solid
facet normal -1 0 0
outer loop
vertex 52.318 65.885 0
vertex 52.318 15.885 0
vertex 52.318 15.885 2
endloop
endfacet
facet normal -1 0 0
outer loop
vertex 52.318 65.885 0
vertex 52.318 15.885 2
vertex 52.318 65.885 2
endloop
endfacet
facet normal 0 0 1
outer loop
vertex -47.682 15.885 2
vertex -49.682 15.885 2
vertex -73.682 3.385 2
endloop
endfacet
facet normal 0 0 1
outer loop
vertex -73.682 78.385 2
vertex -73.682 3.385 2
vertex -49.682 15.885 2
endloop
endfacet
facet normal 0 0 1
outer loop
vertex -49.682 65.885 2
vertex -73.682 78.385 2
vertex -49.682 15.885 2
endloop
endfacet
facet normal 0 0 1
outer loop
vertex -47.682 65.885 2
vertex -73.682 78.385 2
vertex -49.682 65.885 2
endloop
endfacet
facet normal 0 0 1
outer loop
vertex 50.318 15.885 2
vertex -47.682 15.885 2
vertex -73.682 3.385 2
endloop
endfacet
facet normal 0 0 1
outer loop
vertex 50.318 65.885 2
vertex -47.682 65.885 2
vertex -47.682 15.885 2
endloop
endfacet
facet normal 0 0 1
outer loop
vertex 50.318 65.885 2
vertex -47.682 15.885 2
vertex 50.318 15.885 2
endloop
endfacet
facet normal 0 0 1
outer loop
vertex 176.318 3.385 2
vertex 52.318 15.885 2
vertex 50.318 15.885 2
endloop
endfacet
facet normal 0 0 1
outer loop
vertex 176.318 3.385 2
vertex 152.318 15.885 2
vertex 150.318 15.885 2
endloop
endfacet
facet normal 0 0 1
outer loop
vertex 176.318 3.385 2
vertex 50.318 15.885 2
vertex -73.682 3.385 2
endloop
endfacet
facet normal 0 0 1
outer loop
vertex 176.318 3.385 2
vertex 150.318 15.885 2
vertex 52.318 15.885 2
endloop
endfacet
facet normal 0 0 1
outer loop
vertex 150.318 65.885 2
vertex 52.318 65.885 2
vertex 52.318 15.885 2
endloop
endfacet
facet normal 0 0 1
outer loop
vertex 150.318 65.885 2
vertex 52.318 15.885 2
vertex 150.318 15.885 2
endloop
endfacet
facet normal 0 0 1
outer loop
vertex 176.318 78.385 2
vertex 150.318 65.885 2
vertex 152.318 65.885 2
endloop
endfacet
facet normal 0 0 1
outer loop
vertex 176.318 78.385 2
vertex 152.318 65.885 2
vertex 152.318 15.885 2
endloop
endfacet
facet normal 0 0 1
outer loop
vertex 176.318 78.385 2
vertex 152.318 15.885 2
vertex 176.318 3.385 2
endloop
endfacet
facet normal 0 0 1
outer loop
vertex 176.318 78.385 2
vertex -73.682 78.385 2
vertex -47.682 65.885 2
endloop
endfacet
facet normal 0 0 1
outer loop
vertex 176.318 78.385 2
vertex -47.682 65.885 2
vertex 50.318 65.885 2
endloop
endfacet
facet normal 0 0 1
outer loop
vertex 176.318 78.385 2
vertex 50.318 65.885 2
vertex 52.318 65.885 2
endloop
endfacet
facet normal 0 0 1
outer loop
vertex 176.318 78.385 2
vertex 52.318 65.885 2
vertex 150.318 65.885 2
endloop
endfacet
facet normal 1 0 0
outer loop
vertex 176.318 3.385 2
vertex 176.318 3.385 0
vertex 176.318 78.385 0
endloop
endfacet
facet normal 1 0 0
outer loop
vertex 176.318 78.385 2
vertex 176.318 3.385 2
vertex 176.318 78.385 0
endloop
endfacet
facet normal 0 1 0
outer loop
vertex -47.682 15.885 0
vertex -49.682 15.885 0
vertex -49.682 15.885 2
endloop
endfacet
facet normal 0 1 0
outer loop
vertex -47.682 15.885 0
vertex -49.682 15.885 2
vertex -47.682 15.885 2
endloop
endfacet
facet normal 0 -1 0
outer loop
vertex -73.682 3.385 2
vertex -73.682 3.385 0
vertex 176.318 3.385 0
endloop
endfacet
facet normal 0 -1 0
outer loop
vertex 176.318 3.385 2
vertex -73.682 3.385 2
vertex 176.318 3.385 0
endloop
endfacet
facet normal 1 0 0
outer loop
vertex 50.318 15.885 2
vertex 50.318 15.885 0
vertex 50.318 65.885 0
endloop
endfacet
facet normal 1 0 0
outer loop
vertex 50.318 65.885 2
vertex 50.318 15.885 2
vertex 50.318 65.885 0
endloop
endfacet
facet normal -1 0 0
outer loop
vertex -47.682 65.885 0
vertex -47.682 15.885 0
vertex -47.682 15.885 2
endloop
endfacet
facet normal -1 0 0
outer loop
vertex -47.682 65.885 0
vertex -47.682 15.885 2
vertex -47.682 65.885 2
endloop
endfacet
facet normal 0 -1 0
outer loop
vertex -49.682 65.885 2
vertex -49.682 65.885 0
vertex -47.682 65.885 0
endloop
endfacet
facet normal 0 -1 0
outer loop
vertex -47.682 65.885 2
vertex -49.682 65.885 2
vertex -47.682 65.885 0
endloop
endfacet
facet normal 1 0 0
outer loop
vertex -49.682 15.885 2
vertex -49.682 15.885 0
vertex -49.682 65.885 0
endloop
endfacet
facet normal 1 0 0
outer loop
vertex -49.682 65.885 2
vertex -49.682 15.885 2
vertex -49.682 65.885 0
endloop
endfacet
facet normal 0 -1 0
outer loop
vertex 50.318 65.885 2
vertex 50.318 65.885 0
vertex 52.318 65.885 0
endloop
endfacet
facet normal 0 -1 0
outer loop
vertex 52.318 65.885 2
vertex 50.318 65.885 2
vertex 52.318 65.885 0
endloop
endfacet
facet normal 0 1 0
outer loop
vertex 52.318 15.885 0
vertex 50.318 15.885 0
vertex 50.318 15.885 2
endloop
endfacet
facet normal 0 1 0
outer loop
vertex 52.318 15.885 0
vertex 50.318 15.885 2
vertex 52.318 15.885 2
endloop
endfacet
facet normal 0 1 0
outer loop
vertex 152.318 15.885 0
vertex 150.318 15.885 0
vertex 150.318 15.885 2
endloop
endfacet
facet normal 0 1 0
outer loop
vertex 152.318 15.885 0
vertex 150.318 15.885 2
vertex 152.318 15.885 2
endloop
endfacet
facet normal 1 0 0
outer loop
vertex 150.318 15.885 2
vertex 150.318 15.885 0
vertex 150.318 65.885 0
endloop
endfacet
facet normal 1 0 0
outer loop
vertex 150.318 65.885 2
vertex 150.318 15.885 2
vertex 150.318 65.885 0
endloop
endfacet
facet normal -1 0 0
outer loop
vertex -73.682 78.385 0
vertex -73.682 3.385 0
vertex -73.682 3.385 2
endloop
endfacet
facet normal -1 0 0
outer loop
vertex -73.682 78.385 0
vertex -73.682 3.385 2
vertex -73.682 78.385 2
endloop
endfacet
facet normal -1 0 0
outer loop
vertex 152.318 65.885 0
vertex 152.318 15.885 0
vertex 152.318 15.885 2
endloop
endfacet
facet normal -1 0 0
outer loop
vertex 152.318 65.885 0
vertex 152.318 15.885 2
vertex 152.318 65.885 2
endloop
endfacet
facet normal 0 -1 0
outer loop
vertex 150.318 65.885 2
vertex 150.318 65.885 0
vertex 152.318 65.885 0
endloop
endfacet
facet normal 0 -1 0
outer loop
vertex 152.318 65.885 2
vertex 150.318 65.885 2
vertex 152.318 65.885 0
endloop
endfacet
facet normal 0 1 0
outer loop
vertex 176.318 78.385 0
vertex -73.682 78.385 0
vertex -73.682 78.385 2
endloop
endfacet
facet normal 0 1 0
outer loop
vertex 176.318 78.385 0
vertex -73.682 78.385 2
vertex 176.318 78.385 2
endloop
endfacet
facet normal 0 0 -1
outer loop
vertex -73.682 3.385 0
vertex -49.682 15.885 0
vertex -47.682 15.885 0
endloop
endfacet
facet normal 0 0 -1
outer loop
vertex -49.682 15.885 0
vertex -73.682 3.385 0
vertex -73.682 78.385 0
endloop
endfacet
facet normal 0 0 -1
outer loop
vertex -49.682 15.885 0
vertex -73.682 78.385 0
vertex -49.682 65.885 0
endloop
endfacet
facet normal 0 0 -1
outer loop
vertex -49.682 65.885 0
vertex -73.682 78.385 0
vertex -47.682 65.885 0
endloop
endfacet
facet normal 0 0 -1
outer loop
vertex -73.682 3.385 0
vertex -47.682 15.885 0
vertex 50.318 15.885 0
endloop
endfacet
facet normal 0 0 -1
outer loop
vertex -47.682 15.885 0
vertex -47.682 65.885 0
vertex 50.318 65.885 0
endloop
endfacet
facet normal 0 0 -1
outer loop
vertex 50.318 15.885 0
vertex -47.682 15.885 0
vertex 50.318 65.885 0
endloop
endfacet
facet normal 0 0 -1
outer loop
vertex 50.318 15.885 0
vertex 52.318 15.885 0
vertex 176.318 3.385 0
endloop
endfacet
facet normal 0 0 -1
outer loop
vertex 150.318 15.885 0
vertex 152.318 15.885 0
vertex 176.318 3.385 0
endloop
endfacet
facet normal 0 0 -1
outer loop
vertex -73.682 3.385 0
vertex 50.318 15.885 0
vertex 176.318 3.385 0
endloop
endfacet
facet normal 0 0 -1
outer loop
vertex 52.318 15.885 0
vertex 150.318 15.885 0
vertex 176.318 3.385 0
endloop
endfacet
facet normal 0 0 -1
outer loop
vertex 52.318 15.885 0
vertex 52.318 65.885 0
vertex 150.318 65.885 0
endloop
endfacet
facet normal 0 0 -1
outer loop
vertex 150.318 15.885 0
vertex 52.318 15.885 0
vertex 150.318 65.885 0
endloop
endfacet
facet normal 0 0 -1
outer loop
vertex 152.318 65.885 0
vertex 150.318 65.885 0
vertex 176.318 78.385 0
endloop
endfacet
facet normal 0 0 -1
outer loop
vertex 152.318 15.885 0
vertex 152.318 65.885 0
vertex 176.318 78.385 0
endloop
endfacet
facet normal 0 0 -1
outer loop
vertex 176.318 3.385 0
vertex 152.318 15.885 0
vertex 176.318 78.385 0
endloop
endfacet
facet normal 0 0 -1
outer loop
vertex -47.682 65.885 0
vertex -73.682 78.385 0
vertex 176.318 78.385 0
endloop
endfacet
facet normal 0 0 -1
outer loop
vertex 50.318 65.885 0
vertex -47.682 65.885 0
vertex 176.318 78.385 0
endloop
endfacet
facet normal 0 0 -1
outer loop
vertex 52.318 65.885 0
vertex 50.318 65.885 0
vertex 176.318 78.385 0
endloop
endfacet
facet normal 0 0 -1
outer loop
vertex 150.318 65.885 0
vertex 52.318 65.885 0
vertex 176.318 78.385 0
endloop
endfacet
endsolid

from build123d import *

# Parameters (mm, degrees)
SKETCH_2_W               = 250
SKETCH_2_H               = 75
EXTRUDE_3_DEPTH          = 2
CUT_EXTRUDE_1_DEPTH      = 2
CUT_EXTRUDE_1_DEPTH_BACK = 2
SKETCH_4_W               = 2
SKETCH_4_H               = 50


with BuildPart() as part:
    # 草图2 → 凸台-拉伸3 (new body)
    with BuildSketch(Plane.XY):
        with Locations((51.318241286, 40.884671024)):
            Rectangle(SKETCH_2_W, SKETCH_2_H)
    extrude(amount=EXTRUDE_3_DEPTH)

    # 草图4 → 切除-拉伸1 (cut, two sides: drawn at the far end of the back side and taken through both)
    with BuildSketch(Plane.XY.offset(-CUT_EXTRUDE_1_DEPTH_BACK)):
        with Locations((151.318241286, 40.884671024)):
            Rectangle(SKETCH_4_W, SKETCH_4_H)
        with Locations((-48.681758714, 40.884671024)):
            Rectangle(SKETCH_4_W, SKETCH_4_H)
        with Locations((51.318241286, 40.884671024)):
            Rectangle(SKETCH_4_W, SKETCH_4_H)
    extrude(amount=CUT_EXTRUDE_1_DEPTH + CUT_EXTRUDE_1_DEPTH_BACK, mode=Mode.SUBTRACT)


solid = part.part
